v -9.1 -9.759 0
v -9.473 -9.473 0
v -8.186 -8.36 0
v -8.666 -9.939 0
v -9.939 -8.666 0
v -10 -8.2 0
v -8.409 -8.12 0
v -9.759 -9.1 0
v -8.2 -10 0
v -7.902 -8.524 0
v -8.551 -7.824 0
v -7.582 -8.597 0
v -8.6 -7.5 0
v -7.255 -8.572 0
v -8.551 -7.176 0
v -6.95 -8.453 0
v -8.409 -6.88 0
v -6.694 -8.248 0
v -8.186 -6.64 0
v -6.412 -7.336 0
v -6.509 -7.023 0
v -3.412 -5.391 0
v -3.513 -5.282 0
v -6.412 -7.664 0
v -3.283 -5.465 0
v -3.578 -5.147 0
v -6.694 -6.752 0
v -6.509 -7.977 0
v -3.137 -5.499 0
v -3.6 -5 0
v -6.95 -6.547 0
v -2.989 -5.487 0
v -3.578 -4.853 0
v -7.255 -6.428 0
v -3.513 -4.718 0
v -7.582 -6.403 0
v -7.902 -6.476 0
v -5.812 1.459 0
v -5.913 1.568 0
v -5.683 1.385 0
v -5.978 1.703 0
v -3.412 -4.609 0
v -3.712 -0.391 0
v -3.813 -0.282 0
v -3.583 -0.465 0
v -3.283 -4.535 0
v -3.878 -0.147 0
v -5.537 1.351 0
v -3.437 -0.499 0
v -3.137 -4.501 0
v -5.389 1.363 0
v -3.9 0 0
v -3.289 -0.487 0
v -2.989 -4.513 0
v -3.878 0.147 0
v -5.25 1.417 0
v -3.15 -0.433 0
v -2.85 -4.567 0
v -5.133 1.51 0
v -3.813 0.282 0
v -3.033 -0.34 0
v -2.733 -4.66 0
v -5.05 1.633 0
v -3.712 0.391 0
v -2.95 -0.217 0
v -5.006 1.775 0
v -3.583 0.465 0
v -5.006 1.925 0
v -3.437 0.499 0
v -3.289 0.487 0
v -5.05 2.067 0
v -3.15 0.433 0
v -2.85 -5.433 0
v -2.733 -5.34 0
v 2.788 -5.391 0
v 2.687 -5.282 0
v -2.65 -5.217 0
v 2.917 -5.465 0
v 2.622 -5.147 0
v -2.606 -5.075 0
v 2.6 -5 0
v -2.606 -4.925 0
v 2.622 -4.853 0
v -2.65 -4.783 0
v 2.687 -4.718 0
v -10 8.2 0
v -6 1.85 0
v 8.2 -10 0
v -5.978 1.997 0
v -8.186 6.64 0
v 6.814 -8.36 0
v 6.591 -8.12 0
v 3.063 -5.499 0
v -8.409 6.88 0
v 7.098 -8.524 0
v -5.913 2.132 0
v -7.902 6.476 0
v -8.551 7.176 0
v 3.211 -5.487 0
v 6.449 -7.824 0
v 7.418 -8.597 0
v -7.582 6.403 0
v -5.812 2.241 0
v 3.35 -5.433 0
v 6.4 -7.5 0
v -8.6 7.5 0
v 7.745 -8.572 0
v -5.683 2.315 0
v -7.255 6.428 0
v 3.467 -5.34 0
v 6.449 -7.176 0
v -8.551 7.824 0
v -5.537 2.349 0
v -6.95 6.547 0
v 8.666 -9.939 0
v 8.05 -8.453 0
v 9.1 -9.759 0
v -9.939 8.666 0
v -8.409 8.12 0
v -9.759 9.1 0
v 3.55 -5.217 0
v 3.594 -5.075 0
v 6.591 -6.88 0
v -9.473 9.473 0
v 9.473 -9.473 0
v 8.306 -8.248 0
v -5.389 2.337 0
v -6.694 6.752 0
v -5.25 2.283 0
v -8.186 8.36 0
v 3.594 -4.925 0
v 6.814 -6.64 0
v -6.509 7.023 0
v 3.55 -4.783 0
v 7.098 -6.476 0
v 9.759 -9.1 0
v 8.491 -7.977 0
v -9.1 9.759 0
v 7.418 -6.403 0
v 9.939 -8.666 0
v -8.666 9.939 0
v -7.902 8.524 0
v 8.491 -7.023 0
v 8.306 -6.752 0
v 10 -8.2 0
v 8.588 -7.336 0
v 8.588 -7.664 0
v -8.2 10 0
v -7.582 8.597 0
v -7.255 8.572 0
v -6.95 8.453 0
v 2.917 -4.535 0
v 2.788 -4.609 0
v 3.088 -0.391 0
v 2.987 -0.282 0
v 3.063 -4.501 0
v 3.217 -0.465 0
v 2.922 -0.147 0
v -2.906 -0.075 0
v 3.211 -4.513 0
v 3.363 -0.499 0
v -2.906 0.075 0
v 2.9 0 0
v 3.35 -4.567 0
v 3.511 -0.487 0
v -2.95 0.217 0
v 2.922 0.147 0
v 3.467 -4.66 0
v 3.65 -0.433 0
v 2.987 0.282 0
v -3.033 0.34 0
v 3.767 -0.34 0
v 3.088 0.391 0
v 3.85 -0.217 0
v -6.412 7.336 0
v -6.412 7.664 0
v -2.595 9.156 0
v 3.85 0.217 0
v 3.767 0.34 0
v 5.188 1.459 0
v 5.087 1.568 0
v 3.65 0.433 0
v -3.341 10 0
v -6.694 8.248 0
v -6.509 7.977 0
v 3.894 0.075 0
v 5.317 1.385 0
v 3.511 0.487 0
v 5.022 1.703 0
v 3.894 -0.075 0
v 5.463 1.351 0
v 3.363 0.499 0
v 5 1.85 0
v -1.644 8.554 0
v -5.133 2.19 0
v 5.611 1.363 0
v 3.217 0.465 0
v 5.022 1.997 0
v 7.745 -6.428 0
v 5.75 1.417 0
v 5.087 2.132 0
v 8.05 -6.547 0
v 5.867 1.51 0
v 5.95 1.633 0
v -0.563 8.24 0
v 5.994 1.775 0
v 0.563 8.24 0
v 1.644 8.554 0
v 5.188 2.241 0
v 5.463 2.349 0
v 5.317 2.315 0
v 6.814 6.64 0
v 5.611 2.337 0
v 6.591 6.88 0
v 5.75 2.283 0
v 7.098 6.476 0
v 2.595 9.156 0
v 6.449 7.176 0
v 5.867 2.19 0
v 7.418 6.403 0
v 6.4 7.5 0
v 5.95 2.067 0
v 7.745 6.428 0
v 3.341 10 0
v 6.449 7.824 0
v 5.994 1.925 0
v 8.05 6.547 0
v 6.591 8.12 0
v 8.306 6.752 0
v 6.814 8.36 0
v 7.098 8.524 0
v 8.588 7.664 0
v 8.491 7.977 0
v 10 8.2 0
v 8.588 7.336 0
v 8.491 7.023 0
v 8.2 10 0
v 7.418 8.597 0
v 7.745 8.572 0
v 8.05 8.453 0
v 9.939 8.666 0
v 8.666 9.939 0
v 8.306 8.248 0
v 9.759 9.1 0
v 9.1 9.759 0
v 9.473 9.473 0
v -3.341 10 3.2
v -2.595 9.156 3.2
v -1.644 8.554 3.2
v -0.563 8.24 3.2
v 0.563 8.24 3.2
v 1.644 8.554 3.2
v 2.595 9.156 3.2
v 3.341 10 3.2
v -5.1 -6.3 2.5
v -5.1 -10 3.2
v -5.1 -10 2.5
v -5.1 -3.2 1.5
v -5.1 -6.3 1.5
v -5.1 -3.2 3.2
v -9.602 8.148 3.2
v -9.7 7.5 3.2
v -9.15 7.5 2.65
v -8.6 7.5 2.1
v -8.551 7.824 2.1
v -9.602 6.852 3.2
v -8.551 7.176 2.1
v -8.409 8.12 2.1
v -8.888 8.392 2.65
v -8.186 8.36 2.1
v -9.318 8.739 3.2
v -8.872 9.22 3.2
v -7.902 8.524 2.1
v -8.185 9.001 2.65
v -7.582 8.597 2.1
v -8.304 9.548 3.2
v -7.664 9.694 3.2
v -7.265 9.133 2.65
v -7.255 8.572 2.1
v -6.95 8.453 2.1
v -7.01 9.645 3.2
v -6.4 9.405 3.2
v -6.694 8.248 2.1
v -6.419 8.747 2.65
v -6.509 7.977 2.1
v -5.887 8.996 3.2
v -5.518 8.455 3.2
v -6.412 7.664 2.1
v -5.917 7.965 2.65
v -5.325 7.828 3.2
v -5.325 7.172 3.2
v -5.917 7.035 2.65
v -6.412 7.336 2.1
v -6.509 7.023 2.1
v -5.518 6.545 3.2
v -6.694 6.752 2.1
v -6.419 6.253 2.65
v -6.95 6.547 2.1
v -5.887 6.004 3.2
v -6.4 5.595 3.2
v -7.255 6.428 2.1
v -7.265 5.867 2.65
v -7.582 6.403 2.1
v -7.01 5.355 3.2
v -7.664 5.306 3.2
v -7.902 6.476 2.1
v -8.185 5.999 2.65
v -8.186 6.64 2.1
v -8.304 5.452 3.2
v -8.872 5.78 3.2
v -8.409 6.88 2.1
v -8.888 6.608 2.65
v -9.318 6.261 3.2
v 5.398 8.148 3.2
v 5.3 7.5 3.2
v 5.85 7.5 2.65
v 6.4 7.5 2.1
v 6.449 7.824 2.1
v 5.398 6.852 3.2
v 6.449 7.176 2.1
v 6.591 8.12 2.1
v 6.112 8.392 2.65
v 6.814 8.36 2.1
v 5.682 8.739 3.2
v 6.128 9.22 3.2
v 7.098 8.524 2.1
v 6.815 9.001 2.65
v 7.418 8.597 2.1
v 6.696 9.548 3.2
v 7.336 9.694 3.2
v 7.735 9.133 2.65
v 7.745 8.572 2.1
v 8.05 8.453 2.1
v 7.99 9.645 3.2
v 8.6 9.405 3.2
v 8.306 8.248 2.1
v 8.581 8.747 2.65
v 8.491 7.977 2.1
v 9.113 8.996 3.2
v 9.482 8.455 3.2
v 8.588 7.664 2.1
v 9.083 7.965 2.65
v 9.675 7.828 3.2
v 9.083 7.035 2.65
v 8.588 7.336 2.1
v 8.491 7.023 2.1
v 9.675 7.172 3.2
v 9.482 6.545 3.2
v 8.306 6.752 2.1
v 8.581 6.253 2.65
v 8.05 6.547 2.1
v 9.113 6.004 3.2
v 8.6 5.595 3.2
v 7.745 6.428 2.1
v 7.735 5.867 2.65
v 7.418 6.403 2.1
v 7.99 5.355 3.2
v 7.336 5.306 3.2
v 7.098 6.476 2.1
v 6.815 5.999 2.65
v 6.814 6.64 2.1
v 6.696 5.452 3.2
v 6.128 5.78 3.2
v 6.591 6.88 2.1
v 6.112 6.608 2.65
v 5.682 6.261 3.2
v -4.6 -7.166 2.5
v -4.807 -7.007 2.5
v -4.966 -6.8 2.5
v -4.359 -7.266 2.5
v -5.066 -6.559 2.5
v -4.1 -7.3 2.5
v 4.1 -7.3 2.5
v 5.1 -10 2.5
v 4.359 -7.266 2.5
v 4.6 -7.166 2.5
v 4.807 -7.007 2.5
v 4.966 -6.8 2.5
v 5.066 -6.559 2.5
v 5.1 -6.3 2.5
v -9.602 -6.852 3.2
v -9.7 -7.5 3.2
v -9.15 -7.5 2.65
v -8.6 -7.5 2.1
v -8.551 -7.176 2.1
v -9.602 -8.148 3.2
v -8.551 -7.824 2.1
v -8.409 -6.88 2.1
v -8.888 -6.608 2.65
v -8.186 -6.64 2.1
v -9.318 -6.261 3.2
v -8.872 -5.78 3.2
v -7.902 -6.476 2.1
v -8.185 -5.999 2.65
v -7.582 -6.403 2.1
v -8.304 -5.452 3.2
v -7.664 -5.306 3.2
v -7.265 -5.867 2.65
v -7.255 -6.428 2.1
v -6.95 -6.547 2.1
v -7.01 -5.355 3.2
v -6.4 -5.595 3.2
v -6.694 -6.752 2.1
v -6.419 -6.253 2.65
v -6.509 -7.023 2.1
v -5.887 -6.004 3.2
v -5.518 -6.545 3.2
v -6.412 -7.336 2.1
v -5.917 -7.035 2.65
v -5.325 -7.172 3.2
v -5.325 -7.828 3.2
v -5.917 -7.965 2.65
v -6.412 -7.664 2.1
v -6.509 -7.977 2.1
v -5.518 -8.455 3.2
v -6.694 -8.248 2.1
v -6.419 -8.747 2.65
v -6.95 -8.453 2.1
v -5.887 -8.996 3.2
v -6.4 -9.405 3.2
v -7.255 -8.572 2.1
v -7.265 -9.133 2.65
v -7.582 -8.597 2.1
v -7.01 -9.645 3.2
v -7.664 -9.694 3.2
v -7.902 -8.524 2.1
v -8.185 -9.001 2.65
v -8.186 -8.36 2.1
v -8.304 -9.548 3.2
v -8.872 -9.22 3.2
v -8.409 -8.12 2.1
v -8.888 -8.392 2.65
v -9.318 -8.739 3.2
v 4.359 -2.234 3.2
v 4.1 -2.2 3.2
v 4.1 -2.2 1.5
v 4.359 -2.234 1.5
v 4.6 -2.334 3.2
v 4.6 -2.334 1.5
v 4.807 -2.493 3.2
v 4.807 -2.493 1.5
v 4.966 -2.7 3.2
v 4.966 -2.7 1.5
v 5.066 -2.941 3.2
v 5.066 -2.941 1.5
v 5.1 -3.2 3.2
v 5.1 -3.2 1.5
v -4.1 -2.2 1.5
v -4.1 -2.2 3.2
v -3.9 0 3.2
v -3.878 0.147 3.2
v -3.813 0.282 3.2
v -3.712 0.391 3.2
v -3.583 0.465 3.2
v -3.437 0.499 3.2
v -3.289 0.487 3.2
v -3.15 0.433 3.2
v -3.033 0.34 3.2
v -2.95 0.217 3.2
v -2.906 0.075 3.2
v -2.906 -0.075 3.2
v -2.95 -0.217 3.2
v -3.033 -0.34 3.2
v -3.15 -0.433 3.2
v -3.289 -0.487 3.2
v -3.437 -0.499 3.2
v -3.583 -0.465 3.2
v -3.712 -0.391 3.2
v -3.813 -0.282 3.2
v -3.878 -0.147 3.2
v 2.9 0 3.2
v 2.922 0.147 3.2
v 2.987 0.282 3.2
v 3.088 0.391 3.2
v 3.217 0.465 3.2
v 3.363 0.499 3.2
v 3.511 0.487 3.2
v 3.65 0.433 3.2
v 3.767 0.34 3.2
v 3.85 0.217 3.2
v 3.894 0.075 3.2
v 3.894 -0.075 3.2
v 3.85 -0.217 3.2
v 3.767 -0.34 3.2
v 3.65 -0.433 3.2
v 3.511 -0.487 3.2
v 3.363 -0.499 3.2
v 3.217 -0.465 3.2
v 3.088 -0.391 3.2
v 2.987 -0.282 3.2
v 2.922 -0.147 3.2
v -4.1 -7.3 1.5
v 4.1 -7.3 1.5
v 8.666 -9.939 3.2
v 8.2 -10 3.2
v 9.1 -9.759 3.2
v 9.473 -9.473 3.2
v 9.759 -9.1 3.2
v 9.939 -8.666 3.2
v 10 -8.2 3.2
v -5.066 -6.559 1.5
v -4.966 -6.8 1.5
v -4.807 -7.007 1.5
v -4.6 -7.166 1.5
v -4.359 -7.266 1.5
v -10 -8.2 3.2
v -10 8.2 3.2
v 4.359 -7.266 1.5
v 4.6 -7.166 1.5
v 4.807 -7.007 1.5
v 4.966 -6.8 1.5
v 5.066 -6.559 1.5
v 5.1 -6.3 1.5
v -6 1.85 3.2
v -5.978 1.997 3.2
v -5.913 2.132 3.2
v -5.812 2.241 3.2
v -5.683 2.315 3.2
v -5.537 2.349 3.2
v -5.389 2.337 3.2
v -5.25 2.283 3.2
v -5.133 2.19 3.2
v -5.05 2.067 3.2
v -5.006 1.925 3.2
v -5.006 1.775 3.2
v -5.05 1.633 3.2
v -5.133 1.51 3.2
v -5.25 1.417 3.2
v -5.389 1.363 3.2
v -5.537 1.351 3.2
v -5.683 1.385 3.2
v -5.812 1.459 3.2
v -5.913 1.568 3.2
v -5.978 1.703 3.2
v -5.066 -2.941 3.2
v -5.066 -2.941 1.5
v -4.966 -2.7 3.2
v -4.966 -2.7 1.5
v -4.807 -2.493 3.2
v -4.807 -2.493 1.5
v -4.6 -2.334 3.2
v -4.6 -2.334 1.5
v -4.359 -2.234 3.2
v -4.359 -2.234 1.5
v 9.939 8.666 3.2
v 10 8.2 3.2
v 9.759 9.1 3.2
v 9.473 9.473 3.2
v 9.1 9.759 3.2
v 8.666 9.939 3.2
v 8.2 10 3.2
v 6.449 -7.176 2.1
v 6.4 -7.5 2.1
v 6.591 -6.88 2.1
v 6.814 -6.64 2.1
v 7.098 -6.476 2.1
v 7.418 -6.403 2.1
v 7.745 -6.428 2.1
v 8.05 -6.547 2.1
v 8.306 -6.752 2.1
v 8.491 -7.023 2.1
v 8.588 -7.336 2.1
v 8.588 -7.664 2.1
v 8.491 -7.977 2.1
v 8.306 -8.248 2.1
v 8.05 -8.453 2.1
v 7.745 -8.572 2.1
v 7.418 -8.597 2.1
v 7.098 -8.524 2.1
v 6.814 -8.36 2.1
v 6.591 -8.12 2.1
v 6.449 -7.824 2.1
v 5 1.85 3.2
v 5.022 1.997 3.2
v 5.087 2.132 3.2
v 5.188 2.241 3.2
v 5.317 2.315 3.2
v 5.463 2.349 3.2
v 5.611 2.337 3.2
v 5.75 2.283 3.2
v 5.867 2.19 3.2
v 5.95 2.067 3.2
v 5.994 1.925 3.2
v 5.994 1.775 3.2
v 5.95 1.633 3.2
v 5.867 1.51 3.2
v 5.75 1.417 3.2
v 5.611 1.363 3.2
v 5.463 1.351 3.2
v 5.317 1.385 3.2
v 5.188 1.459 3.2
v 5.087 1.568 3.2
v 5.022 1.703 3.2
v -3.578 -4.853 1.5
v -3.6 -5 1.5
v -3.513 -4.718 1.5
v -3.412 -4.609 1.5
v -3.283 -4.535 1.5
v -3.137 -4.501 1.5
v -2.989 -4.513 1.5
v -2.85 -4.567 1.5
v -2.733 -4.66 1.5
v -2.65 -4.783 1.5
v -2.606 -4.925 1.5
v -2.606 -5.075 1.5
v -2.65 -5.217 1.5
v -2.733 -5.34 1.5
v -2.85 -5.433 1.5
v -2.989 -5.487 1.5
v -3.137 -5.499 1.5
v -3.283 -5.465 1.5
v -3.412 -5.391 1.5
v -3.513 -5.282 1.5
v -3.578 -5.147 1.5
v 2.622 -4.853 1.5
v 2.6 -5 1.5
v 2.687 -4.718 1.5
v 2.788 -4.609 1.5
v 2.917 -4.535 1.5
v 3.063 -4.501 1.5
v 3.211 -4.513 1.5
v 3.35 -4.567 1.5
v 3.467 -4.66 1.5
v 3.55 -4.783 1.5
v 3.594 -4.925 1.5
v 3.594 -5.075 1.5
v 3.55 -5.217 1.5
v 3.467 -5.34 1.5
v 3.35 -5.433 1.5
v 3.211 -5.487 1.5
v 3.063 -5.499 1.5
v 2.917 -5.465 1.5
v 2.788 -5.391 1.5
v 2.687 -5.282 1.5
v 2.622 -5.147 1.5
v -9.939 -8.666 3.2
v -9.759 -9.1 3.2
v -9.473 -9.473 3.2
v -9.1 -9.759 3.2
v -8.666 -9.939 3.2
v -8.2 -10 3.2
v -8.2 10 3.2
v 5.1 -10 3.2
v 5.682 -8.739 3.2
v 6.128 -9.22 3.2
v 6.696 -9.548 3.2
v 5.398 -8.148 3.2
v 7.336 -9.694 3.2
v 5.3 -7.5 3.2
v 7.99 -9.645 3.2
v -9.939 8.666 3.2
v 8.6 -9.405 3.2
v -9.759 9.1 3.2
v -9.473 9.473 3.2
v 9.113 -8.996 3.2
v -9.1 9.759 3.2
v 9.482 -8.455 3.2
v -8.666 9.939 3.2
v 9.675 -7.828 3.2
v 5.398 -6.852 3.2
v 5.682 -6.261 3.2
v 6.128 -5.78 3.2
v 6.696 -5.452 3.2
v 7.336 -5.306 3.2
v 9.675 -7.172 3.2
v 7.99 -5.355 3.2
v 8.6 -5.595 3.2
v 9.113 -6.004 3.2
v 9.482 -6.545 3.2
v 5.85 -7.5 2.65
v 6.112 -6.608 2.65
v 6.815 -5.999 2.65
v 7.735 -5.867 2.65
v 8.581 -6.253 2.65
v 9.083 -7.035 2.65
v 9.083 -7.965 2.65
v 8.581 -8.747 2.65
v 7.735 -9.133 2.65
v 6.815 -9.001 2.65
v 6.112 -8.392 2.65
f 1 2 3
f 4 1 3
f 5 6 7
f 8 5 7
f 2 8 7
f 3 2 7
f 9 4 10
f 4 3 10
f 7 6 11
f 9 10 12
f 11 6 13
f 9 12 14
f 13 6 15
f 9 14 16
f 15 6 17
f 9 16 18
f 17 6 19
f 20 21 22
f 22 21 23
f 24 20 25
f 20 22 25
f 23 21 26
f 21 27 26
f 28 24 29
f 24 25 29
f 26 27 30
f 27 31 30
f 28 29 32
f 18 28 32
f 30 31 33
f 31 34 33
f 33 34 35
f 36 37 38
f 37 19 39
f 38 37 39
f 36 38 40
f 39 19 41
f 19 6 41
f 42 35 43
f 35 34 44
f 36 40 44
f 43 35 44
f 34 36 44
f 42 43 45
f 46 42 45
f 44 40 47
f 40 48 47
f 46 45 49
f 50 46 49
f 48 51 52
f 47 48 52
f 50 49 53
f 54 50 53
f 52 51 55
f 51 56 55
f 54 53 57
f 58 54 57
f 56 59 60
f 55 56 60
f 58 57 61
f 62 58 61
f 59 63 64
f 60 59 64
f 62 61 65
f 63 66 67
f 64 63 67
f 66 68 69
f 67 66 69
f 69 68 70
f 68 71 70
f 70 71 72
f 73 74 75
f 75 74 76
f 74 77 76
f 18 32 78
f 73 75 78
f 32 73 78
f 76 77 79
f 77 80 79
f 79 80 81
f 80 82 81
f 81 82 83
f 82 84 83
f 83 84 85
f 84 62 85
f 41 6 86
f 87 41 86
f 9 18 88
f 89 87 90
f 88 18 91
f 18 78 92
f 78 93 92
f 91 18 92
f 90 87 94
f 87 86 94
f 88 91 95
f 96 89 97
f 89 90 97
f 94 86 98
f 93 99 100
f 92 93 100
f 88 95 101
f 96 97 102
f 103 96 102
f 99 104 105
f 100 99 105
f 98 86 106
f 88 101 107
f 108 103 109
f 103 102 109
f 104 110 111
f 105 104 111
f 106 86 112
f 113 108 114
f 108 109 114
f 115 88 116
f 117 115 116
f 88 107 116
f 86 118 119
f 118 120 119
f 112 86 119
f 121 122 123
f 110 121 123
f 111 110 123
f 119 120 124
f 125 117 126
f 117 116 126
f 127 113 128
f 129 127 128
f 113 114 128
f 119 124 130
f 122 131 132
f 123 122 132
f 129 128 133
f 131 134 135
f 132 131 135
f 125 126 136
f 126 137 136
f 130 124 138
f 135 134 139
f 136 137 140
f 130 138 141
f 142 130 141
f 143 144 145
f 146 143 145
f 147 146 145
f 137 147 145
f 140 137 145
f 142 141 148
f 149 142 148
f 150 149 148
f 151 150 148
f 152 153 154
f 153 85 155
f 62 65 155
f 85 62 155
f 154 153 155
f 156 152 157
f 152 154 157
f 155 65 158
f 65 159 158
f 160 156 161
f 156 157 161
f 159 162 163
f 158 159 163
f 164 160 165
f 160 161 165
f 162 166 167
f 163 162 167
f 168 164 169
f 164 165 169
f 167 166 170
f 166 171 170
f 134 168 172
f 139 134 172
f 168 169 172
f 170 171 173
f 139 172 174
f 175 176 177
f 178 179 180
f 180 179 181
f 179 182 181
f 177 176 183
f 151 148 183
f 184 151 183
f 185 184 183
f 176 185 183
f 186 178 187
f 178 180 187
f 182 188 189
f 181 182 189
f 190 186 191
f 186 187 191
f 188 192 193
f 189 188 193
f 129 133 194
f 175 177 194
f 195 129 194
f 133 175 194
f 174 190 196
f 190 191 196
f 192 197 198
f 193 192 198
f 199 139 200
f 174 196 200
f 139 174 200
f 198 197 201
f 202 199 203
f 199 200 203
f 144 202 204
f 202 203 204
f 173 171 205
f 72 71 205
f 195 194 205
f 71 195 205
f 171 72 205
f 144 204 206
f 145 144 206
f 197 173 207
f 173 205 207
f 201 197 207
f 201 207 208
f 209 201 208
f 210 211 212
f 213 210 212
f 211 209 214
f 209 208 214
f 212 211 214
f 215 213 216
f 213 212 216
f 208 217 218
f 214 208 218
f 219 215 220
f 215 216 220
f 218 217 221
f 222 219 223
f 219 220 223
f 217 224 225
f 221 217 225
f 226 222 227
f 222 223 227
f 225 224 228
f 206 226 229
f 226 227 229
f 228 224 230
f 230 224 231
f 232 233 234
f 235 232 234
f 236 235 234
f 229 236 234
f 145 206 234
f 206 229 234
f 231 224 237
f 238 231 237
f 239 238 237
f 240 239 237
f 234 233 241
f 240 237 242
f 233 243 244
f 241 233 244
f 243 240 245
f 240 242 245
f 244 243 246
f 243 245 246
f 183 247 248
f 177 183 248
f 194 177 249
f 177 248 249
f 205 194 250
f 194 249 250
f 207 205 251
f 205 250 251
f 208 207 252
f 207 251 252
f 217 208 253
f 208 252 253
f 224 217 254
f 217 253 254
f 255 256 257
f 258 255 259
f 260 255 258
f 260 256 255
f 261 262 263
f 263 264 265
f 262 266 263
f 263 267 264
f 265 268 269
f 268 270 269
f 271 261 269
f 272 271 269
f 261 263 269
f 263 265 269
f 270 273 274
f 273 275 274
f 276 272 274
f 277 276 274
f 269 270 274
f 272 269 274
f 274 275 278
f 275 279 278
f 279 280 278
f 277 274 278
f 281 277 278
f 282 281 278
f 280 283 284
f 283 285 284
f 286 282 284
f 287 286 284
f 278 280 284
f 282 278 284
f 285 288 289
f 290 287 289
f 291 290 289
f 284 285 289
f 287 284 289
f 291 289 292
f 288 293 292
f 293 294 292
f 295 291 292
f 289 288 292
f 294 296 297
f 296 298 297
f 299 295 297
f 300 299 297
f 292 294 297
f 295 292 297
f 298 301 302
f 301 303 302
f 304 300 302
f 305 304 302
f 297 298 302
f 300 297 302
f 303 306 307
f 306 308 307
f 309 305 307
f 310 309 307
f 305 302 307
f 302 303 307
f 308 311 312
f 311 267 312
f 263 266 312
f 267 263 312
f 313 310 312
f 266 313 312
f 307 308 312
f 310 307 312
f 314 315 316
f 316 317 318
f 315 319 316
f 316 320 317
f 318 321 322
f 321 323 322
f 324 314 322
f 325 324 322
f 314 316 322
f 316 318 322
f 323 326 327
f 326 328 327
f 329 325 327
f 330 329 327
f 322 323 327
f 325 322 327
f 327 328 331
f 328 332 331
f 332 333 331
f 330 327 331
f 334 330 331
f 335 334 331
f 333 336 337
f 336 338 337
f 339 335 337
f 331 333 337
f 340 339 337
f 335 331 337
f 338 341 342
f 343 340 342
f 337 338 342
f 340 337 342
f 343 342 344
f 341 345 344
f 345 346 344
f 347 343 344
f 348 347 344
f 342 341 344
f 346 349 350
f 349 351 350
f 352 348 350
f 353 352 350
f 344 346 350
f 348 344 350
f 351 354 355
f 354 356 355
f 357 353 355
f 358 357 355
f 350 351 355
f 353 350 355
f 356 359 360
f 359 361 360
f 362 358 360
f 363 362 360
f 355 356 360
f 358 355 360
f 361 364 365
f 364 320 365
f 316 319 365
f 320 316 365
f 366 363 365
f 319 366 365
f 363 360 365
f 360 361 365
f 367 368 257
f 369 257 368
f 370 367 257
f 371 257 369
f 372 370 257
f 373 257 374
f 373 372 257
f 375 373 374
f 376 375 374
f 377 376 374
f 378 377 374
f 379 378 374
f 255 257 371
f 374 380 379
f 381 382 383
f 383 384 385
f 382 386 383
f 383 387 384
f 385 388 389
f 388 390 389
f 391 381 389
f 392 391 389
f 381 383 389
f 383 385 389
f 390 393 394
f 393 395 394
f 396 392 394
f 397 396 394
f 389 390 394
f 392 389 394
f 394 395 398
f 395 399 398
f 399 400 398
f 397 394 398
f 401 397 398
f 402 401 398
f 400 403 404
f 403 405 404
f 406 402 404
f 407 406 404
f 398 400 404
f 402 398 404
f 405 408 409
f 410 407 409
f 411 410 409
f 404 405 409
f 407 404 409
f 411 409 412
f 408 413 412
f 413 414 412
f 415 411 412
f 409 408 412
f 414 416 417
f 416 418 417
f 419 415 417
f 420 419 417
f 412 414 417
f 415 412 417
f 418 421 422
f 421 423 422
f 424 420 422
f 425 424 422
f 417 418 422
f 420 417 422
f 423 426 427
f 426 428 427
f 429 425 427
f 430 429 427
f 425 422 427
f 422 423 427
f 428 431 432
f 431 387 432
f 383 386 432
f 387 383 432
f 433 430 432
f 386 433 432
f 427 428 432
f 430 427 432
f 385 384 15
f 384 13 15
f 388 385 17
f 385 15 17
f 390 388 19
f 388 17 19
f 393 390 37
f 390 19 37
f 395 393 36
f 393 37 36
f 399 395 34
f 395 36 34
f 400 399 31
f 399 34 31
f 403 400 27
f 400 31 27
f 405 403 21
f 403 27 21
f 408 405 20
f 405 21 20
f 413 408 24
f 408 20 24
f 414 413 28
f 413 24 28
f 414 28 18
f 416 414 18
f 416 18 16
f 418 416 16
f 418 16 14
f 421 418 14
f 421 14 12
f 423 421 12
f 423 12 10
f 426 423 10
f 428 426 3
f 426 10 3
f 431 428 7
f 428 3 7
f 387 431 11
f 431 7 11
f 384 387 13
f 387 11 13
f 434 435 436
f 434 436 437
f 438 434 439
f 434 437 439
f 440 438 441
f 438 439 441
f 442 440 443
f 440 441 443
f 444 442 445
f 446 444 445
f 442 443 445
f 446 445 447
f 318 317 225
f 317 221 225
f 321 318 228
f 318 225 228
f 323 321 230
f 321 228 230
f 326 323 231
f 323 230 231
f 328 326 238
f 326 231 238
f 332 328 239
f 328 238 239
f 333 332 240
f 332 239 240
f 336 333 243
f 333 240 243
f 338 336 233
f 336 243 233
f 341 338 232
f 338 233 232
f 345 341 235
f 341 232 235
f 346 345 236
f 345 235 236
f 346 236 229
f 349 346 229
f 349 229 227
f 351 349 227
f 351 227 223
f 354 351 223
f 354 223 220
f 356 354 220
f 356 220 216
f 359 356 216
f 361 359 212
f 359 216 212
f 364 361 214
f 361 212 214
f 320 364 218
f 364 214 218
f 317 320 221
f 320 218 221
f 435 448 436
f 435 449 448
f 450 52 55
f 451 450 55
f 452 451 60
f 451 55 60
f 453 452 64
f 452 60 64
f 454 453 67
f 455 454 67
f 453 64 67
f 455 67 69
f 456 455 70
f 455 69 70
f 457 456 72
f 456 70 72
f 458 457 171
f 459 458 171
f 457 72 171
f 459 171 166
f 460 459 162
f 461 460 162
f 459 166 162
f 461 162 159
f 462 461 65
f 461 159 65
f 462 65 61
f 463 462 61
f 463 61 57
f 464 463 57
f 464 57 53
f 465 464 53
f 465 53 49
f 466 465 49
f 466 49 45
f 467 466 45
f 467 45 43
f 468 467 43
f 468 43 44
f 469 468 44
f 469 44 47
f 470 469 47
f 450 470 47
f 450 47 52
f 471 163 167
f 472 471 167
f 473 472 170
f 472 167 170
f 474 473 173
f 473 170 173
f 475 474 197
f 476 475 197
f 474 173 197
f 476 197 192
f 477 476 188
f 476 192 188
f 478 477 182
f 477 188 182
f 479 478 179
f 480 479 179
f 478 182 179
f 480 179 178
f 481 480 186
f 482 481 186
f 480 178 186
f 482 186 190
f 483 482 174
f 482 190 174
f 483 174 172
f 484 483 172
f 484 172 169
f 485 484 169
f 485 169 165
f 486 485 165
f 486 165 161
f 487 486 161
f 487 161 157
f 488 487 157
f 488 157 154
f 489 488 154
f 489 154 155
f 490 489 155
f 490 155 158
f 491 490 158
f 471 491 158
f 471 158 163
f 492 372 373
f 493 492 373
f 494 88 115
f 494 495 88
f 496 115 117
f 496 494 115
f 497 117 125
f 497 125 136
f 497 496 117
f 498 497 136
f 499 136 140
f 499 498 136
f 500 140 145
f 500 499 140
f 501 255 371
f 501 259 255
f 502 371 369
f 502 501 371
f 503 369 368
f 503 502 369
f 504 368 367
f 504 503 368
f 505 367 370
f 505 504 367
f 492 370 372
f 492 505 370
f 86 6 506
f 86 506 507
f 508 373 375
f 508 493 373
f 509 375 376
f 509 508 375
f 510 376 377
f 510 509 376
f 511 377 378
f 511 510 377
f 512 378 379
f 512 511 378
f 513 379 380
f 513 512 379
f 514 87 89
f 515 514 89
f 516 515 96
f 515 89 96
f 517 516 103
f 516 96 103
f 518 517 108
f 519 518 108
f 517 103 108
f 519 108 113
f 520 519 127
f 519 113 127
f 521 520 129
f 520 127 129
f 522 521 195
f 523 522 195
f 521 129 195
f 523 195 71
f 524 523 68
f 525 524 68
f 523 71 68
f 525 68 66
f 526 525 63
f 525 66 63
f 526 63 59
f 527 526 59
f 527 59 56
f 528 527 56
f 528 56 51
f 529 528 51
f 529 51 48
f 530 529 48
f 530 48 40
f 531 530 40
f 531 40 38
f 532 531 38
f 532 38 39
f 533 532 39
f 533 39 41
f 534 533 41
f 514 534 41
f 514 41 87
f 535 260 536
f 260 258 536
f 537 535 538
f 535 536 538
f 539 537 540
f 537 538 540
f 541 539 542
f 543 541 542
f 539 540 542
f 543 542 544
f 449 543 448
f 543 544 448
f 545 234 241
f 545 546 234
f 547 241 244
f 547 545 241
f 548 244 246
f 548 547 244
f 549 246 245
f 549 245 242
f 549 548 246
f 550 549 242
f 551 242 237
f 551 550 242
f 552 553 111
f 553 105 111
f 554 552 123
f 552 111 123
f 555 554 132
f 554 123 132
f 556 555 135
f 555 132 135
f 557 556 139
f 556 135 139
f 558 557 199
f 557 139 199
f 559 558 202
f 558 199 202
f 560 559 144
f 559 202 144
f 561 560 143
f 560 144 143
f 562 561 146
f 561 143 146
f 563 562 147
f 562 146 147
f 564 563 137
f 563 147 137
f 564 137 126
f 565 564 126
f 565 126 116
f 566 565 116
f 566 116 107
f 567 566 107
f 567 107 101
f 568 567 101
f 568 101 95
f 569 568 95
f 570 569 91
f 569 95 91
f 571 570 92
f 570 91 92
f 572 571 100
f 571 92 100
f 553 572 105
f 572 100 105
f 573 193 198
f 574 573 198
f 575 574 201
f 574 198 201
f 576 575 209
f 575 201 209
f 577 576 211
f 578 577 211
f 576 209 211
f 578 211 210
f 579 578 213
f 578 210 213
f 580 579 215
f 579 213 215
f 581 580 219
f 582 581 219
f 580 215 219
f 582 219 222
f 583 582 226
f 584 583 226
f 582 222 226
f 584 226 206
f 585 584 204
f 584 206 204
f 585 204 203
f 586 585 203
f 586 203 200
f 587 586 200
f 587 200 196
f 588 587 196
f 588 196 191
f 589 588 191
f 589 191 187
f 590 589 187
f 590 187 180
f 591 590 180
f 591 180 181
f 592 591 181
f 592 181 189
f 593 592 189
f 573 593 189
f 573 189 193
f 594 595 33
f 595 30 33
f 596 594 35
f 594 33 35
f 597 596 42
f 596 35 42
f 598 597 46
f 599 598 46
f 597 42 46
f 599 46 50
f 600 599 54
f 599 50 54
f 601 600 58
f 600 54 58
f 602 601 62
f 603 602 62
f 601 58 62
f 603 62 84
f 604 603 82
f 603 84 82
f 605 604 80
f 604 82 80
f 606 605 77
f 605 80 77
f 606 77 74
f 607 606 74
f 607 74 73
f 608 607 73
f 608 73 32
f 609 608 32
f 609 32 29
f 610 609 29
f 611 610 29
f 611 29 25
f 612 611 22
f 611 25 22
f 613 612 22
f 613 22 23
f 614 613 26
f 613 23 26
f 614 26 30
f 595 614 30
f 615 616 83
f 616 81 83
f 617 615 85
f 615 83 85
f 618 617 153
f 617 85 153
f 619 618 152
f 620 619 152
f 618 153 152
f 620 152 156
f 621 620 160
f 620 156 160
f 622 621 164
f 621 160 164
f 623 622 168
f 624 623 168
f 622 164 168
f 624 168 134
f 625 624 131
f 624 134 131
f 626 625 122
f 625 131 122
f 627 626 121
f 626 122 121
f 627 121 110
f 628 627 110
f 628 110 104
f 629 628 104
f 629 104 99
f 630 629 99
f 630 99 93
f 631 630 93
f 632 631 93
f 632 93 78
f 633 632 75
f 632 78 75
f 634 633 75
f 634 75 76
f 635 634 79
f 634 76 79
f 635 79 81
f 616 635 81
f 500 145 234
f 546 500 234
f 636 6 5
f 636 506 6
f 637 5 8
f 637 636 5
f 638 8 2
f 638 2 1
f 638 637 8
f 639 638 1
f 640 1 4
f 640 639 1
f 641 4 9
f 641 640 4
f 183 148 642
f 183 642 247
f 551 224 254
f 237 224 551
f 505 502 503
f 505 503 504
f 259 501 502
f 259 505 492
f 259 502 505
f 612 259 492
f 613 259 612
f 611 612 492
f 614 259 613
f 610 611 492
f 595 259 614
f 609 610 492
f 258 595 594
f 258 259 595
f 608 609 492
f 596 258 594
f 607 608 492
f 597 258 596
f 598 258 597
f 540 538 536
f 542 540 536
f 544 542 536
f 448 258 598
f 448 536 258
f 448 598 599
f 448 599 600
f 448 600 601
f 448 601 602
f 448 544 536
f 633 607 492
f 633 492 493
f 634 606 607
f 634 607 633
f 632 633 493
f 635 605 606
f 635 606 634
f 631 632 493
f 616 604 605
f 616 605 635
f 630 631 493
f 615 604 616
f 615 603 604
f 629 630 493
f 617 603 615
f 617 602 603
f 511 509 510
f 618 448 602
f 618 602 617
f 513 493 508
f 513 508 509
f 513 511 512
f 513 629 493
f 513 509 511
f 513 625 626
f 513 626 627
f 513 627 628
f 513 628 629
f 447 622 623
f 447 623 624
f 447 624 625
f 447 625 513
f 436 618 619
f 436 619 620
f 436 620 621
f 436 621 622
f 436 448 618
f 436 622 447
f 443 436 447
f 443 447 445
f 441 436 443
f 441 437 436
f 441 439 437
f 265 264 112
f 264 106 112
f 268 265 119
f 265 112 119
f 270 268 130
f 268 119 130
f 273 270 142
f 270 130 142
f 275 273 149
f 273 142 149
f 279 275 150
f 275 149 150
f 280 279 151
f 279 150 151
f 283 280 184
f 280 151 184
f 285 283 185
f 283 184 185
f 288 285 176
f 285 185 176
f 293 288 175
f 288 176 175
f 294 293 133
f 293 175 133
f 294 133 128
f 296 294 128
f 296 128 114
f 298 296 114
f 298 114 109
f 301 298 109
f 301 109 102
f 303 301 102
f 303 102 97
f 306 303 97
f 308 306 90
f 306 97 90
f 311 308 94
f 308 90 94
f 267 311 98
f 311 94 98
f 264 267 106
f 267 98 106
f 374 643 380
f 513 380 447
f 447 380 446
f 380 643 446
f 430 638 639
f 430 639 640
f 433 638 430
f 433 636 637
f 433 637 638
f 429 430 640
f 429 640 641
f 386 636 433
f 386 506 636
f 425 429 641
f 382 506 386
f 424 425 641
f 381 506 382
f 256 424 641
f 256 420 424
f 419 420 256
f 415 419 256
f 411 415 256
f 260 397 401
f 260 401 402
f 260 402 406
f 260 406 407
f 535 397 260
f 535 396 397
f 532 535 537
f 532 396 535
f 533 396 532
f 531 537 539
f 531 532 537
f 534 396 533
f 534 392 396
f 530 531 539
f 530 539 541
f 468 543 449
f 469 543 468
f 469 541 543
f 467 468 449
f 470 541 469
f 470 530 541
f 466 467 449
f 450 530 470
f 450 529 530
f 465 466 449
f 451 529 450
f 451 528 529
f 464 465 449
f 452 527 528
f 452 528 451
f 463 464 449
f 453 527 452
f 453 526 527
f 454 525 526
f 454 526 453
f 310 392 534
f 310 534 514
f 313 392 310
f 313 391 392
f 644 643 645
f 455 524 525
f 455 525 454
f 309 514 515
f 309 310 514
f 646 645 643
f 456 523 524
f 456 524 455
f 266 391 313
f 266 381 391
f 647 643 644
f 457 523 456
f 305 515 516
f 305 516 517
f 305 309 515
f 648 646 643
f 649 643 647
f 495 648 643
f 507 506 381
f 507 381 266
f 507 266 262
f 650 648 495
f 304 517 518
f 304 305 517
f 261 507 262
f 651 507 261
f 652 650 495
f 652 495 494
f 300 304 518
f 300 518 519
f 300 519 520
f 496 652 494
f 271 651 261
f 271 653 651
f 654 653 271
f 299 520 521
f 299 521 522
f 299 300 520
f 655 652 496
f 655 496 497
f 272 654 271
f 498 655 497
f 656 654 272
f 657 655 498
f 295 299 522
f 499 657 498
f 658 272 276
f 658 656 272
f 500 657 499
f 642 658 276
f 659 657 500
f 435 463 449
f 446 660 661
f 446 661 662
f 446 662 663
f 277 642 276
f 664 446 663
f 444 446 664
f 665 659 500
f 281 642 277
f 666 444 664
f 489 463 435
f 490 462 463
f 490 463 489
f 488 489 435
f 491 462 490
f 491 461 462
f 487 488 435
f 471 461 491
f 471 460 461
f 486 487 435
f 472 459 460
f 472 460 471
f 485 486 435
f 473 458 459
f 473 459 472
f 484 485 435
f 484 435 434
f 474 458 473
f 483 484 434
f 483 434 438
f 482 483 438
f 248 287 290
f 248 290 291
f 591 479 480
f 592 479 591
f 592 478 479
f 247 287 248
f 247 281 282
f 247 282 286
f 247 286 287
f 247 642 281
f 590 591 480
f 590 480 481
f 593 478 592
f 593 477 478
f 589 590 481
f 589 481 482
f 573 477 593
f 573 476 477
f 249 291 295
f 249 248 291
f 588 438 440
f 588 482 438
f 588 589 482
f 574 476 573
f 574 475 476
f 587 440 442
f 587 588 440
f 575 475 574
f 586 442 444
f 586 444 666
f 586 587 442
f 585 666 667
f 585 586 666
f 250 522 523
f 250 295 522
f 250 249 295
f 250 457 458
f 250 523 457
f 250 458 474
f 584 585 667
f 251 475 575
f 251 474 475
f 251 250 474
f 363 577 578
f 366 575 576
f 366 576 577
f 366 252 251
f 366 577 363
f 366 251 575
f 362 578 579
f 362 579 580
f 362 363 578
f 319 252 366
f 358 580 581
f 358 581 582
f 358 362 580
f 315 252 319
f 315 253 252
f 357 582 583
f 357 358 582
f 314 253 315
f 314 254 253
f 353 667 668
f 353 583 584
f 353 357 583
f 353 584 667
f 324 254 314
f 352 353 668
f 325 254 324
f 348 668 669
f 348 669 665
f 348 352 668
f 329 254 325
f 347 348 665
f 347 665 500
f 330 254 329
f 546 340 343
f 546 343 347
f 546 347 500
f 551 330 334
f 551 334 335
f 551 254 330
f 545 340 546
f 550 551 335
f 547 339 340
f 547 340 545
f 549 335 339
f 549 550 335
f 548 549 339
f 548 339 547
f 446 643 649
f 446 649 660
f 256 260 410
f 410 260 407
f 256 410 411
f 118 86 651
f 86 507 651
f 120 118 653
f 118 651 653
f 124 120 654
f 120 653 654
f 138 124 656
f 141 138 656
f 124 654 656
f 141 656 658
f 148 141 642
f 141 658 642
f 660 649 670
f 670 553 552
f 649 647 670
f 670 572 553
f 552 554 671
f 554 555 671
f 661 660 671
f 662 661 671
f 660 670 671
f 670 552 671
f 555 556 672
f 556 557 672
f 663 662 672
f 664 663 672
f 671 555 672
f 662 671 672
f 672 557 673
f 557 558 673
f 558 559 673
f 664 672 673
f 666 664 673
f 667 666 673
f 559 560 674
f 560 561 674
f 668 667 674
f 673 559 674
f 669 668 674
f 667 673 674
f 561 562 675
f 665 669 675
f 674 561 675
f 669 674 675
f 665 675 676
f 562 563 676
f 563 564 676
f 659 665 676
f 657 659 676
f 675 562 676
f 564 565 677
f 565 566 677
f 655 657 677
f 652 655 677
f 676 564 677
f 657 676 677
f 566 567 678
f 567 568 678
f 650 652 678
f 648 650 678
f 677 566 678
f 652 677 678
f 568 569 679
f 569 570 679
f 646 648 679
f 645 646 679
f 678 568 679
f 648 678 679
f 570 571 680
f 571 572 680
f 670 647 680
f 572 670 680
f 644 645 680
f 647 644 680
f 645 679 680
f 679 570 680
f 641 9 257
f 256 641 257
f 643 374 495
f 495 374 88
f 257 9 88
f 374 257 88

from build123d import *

# Parameters (mm, degrees)
ESQUISSE1_W                                    = 20
ESQUISSE1_H                                    = 20
BOSS_EXTRU_1_DEPTH                             = 3.2
CONG_1_R                                       = 1.8
DIAM_TRE_DU_PER_AGE_1_0_1_1_D                  = 1
ESQUISSE4_W                                    = 10.2
ESQUISSE4_H                                    = 7.8
ENL_V_MAT_EXTRU_1_DEPTH                        = 0.7
ESQUISSE5_W                                    = 10.2
ESQUISSE5_H                                    = 5.1
ENL_V_MAT_EXTRU_2_DEPTH                        = 1
CONG_2_R                                       = 1
FRAISAGE_POUR_VIS_T_TE_FRAIS_E_M21_D           = 2.2
FRAISAGE_POUR_VIS_T_TE_FRAIS_E_M21_CSINK_D     = 4.4
FRAISAGE_POUR_VIS_T_TE_FRAIS_E_M21_CSINK_ANGLE = 90
ESQUISSE8_R                                    = 4
ENL_V_MAT_EXTRU_3_DEPTH                        = 15.499655168


with BuildPart() as part:
    # Esquisse1 → Boss.-Extru.1 (new body)
    with BuildSketch(Plane.XY):
        Rectangle(ESQUISSE1_W, ESQUISSE1_H)
    extrude(amount=BOSS_EXTRU_1_DEPTH)

    # Congé1
    cong_1_edges = [part.edges().sort_by_distance(p)[0] for p in [
        (-10, 10, 1.6),
        (10, 10, 1.6),
        (10, -10, 1.6),
        (-10, -10, 1.6),
    ]]
    fillet(cong_1_edges, radius=CONG_1_R)

    # Diamètre du perçage Ø1.0 (1)1 (through all)
    with Locations(Plane.XY.offset(3.2)):
        with Locations((3.1, -5), (3.4, 0), (5.5, 1.85), (-5.5, 1.85), (-3.4, 0), (-3.1, -5)):
            Hole(DIAM_TRE_DU_PER_AGE_1_0_1_1_D / 2)

    # Esquisse4 → Enlèv. mat.-Extru.1 (cut)
    with BuildSketch(Plane.XY.offset(3.2)):
        with Locations((0, -6.1)):
            Rectangle(ESQUISSE4_W, ESQUISSE4_H)
    extrude(amount=-ENL_V_MAT_EXTRU_1_DEPTH, mode=Mode.SUBTRACT)

    # Esquisse5 → Enlèv. mat.-Extru.2 (cut)
    with BuildSketch(Plane.XY.offset(2.5)):
        with Locations((0, -4.75)):
            Rectangle(ESQUISSE5_W, ESQUISSE5_H)
    extrude(amount=-ENL_V_MAT_EXTRU_2_DEPTH, mode=Mode.SUBTRACT)

    # Congé2
    cong_2_edges = [part.edges().sort_by_distance(p)[0] for p in [
        (-5.1, -2.2, 2.35),
        (5.1, -2.2, 2.35),
        (-5.1, -7.3, 2),
        (5.1, -7.3, 2),
    ]]
    fillet(cong_2_edges, radius=CONG_2_R)

    # Fraisage pour vis à tête fraisée M21 (through all)
    with Locations(Plane.XY.offset(3.2)):
        with Locations((-7.5, 7.5), (-7.5, -7.5), (7.5, -7.5), (7.5, 7.5)):
            CounterSinkHole(FRAISAGE_POUR_VIS_T_TE_FRAIS_E_M21_D / 2, FRAISAGE_POUR_VIS_T_TE_FRAIS_E_M21_CSINK_D / 2, counter_sink_angle=FRAISAGE_POUR_VIS_T_TE_FRAIS_E_M21_CSINK_ANGLE)

    # Esquisse8 → Enlèv. mat.-Extru.3 (cut, through all)
    with BuildSketch(Plane.XY.offset(3.2)):
        with Locations((0, 12.2)):
            Circle(ESQUISSE8_R)
    extrude(amount=-ENL_V_MAT_EXTRU_3_DEPTH, mode=Mode.SUBTRACT)


solid = part.part
